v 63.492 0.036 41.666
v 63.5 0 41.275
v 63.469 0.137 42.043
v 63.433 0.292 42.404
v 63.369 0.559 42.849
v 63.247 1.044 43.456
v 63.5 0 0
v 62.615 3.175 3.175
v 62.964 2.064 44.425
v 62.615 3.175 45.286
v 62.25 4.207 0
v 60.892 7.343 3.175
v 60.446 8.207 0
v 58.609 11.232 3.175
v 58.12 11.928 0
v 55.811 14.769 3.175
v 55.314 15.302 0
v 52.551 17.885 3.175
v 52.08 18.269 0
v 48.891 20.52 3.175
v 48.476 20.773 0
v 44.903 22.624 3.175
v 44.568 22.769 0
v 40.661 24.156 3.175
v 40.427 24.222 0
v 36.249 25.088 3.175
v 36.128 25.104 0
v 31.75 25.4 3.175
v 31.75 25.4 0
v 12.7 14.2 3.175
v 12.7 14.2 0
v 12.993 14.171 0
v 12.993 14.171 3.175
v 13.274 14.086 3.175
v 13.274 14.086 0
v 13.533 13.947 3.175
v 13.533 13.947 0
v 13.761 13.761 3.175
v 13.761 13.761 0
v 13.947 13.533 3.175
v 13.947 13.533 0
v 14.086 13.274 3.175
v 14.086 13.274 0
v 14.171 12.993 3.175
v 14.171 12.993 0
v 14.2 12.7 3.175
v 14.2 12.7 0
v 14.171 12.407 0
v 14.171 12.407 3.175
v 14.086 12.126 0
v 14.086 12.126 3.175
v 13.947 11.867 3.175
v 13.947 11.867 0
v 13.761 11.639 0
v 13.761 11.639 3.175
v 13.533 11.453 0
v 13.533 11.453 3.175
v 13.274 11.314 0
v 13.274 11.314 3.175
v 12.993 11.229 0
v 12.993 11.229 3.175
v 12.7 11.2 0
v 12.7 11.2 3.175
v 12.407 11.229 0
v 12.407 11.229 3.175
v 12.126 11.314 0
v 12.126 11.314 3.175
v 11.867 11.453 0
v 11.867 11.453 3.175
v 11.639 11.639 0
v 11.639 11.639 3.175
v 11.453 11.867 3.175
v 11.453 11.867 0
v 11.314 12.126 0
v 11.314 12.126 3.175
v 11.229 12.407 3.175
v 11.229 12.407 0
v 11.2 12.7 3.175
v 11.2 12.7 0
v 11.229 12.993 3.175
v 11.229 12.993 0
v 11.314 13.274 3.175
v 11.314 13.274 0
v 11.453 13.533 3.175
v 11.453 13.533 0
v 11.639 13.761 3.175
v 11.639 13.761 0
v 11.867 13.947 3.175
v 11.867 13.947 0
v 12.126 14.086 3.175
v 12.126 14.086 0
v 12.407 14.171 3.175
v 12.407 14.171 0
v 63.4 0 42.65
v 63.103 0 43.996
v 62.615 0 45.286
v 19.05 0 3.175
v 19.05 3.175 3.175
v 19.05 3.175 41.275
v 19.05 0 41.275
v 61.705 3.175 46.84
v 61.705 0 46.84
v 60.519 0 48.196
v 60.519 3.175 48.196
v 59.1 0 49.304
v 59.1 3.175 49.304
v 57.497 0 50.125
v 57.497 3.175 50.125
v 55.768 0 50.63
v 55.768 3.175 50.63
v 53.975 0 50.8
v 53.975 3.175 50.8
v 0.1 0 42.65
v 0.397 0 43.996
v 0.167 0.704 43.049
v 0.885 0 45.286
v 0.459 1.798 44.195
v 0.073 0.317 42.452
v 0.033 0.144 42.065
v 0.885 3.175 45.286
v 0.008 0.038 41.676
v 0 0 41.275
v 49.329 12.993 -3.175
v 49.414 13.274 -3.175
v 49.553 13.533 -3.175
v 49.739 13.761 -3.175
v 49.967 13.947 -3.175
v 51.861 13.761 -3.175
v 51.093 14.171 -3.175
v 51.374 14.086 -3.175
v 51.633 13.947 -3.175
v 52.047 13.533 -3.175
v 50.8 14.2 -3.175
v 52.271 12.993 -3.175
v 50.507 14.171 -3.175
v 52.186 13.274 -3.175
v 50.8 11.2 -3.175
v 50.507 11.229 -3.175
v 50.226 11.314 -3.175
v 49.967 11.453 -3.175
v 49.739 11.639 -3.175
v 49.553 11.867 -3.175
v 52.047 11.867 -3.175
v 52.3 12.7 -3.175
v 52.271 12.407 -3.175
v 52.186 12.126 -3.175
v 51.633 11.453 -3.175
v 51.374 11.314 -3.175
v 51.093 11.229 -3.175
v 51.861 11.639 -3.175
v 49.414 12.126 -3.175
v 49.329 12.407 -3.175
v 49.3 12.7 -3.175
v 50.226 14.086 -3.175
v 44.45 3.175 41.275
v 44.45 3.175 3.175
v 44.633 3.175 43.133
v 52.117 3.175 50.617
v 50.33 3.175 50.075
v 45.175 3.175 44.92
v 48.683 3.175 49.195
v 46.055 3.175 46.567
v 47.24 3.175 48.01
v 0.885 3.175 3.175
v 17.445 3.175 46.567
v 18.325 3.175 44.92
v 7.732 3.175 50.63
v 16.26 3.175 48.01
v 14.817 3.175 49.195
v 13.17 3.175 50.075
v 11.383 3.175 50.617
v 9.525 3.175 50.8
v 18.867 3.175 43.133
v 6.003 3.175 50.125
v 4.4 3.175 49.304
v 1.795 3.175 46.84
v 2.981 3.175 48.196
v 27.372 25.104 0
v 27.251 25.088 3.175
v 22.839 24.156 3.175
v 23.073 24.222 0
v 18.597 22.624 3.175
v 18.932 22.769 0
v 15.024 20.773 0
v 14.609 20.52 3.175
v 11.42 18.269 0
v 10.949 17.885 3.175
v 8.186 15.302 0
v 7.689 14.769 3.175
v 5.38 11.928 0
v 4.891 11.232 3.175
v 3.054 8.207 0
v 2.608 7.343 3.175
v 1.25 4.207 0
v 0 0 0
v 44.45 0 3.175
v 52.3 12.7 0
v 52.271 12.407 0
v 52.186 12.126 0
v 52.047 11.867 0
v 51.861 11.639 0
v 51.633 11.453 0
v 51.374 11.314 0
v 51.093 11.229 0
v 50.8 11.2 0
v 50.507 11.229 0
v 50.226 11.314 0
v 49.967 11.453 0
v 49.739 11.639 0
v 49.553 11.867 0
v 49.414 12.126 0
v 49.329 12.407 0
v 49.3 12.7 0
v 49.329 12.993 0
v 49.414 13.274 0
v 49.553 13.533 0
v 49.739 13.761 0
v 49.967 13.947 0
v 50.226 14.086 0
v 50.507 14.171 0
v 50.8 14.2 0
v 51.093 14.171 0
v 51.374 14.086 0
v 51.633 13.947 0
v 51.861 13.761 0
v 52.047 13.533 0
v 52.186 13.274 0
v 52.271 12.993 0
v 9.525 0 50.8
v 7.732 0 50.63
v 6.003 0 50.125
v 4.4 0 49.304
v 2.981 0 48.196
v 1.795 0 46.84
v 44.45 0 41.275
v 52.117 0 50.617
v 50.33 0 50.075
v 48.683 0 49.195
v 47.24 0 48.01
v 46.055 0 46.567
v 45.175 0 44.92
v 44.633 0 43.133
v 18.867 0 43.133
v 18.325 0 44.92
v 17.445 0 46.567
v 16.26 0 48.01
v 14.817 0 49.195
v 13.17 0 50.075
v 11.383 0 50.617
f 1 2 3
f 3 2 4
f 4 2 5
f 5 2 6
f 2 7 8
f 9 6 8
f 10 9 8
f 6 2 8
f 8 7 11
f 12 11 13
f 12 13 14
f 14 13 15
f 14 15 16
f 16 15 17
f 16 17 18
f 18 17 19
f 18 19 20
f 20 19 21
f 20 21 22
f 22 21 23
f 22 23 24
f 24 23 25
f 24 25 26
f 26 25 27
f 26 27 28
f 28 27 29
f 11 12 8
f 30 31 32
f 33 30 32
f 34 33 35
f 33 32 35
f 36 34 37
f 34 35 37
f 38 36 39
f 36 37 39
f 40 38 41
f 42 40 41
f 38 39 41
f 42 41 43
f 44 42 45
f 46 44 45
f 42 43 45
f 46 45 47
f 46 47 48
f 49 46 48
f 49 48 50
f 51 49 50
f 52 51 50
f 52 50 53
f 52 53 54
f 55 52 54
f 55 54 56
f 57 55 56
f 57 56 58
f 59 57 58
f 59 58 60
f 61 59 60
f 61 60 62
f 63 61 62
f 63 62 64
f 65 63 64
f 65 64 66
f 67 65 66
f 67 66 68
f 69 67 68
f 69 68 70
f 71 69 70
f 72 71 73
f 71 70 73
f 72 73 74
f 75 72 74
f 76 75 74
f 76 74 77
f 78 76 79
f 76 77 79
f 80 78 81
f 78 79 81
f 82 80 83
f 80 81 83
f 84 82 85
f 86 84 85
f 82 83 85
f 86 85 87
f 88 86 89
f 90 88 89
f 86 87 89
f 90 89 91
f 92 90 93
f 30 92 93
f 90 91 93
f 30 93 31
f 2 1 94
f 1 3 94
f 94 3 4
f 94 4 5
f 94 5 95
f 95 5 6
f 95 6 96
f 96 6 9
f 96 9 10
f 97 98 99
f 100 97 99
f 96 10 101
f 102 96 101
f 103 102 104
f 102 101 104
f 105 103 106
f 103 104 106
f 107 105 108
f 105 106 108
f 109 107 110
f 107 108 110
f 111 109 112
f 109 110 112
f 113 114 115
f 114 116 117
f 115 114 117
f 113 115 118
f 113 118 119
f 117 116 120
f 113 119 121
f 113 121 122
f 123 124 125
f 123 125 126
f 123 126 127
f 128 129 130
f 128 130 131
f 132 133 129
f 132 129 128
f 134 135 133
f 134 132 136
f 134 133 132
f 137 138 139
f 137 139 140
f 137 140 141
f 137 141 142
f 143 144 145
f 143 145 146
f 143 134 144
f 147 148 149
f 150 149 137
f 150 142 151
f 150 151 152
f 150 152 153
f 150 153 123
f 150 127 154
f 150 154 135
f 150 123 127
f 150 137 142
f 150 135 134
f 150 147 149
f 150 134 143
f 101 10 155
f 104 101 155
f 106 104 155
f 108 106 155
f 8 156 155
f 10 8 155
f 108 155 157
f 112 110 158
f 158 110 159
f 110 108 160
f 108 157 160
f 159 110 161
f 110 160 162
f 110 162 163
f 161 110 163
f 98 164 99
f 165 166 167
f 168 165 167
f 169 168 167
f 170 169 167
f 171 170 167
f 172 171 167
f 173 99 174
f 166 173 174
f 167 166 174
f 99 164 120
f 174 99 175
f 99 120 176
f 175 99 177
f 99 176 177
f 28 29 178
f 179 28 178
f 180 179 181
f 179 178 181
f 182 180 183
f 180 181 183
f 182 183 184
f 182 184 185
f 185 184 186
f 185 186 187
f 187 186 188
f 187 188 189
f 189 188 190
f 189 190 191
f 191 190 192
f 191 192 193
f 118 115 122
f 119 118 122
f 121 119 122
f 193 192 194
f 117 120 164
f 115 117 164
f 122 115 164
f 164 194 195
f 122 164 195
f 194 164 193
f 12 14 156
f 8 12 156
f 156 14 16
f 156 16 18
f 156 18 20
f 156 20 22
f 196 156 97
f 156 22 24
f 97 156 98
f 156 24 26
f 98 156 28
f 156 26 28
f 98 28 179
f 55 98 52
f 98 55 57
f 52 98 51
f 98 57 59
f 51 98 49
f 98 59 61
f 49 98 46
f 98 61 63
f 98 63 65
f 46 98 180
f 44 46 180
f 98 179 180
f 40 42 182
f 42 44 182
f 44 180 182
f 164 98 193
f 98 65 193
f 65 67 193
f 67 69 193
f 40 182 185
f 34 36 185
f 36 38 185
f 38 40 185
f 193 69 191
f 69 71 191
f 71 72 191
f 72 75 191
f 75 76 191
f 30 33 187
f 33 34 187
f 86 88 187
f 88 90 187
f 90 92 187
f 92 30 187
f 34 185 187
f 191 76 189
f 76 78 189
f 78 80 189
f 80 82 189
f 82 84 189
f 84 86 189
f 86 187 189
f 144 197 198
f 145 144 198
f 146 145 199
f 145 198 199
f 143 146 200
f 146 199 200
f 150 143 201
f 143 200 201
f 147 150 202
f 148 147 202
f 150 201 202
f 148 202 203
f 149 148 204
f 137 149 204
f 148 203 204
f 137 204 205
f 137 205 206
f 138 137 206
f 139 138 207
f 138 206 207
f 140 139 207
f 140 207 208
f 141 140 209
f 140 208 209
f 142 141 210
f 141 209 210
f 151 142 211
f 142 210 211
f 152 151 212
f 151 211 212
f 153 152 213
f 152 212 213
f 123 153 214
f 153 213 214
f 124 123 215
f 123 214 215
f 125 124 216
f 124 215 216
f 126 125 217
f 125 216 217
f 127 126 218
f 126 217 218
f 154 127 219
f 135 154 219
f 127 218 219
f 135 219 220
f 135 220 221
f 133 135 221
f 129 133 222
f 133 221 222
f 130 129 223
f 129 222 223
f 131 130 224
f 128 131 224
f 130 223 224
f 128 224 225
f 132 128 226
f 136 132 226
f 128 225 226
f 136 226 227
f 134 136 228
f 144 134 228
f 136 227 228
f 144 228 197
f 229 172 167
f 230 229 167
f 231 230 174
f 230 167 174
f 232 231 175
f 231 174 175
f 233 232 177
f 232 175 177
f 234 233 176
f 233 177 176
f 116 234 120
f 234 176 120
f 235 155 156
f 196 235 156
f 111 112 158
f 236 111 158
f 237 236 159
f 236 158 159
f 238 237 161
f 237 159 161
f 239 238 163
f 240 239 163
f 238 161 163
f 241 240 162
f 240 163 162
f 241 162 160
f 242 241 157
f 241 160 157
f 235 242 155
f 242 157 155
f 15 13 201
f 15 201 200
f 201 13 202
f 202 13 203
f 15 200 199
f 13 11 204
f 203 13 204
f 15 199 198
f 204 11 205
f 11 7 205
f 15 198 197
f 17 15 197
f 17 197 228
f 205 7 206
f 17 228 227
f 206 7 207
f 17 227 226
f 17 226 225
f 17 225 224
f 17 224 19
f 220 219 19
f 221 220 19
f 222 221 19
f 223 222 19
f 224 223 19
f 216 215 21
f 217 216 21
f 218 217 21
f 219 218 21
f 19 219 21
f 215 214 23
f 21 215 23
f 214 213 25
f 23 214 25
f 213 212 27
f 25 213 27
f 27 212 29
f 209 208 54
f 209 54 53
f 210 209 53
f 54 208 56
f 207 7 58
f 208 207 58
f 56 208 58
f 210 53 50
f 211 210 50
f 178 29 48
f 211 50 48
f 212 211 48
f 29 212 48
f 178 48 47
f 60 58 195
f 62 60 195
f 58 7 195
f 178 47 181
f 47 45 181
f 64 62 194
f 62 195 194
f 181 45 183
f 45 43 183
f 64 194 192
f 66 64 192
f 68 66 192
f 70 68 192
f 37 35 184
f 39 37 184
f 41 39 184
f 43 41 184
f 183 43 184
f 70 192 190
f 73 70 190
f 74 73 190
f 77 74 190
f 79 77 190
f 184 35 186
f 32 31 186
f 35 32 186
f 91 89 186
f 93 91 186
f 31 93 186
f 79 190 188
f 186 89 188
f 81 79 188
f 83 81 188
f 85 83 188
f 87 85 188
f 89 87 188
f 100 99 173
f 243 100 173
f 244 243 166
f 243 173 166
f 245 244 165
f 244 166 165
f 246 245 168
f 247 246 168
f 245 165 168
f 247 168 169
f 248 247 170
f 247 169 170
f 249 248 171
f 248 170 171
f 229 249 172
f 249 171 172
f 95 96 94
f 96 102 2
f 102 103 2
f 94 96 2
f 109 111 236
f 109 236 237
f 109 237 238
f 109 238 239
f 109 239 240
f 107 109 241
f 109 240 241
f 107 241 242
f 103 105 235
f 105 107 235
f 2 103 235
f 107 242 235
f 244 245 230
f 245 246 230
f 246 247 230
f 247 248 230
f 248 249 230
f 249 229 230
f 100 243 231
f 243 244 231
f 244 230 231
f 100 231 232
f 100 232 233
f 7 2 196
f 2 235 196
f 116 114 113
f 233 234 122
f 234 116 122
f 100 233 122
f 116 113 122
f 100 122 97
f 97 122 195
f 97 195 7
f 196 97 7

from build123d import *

# Parameters (mm, degrees)
BOSS_EXTRUDE1_DEPTH = 63.5
SKETCH3_R           = 1.5
CUT_EXTRUDE1_DEPTH  = 86.194189943
SKETCH3_3_R         = 1.5
BOSS_EXTRUDE2_DEPTH = 3.175
CUT_EXTRUDE2_DEPTH  = 86.194189943
CUT_EXTRUDE3_DEPTH  = 3.175


with BuildPart() as part:
    # Sketch2 → Boss-Extrude1 (new body)
    with BuildSketch(Plane(origin=(0, 0, 0), x_dir=(0, 0, -1), z_dir=(1, 0, 0))):
        Polygon((-50.8, 0), (0, 0), (0, 25.4), (-3.175, 25.4), (-3.175, 3.175), (-50.8, 3.175), align=None)
    extrude(amount=BOSS_EXTRUDE1_DEPTH)

    # Sketch3 → Cut-Extrude1 (cut, through all)
    with BuildSketch(Plane(origin=(0, 0, 0), x_dir=(-1, 0, 0), z_dir=(0, 0, -1))):
        with Locations((-12.7, 12.7)):
            Circle(SKETCH3_R)
    extrude(amount=-CUT_EXTRUDE1_DEPTH, mode=Mode.SUBTRACT)

    # Sketch3<3> → Boss-Extrude2 (add)
    with BuildSketch(Plane(origin=(0, 0, 0), x_dir=(-1, 0, 0), z_dir=(0, 0, -1))):
        with Locations((-50.8, 12.7)):
            Circle(SKETCH3_3_R)
    extrude(amount=BOSS_EXTRUDE2_DEPTH)

    # Sketch4 → Cut-Extrude2 (cut, through all)
    with BuildSketch(Plane(origin=(0, 0, 0), x_dir=(-1, 0, 0), z_dir=(0, 0, -1))):
        with BuildLine():
            Line((-63.5, 25.4), (-63.5, 0))
            ThreePointArc((-63.5, 0), (-52.079919454, 18.268649317), (-31.75, 25.4))
            Line((-31.75, 25.4), (-63.5, 25.4))
        make_face()
        with BuildLine():
            ThreePointArc((-31.75, 25.4), (-11.420080546, 18.268649317), (0, 0))
            Line((0, 0), (0, 25.4))
            Line((0, 25.4), (-31.75, 25.4))
        make_face()
    extrude(amount=-CUT_EXTRUDE2_DEPTH, mode=Mode.SUBTRACT)

    # Sketch5 → Cut-Extrude3 (cut)
    with BuildSketch(Plane(origin=(0, 3.175, 0), x_dir=(1, 0, 0), z_dir=(0, 1, 0))):
        with BuildLine():
            Line((0, -41.275), (0, -50.8))
            Line((0, -50.8), (9.525, -50.8))
            ThreePointArc((9.525, -50.8), (2.789807909, -48.010192091), (0, -41.275))
        make_face()
        with BuildLine():
            Line((44.45, -3.175), (19.05, -3.175))
            Line((19.05, -3.175), (19.05, -41.275))
            ThreePointArc((19.05, -41.275), (16.260192091, -48.010192091), (9.525, -50.8))
            Line((9.525, -50.8), (53.975, -50.8))
            ThreePointArc((53.975, -50.8), (47.239807909, -48.010192091), (44.45, -41.275))
            Line((44.45, -41.275), (44.45, -3.175))
        make_face()
        with BuildLine():
            Line((53.975, -50.8), (63.5, -50.8))
            Line((63.5, -50.8), (63.5, -41.275))
            ThreePointArc((63.5, -41.275), (60.710192091, -48.010192091), (53.975, -50.8))
        make_face()
    extrude(amount=-CUT_EXTRUDE3_DEPTH, mode=Mode.SUBTRACT)


solid = part.part
